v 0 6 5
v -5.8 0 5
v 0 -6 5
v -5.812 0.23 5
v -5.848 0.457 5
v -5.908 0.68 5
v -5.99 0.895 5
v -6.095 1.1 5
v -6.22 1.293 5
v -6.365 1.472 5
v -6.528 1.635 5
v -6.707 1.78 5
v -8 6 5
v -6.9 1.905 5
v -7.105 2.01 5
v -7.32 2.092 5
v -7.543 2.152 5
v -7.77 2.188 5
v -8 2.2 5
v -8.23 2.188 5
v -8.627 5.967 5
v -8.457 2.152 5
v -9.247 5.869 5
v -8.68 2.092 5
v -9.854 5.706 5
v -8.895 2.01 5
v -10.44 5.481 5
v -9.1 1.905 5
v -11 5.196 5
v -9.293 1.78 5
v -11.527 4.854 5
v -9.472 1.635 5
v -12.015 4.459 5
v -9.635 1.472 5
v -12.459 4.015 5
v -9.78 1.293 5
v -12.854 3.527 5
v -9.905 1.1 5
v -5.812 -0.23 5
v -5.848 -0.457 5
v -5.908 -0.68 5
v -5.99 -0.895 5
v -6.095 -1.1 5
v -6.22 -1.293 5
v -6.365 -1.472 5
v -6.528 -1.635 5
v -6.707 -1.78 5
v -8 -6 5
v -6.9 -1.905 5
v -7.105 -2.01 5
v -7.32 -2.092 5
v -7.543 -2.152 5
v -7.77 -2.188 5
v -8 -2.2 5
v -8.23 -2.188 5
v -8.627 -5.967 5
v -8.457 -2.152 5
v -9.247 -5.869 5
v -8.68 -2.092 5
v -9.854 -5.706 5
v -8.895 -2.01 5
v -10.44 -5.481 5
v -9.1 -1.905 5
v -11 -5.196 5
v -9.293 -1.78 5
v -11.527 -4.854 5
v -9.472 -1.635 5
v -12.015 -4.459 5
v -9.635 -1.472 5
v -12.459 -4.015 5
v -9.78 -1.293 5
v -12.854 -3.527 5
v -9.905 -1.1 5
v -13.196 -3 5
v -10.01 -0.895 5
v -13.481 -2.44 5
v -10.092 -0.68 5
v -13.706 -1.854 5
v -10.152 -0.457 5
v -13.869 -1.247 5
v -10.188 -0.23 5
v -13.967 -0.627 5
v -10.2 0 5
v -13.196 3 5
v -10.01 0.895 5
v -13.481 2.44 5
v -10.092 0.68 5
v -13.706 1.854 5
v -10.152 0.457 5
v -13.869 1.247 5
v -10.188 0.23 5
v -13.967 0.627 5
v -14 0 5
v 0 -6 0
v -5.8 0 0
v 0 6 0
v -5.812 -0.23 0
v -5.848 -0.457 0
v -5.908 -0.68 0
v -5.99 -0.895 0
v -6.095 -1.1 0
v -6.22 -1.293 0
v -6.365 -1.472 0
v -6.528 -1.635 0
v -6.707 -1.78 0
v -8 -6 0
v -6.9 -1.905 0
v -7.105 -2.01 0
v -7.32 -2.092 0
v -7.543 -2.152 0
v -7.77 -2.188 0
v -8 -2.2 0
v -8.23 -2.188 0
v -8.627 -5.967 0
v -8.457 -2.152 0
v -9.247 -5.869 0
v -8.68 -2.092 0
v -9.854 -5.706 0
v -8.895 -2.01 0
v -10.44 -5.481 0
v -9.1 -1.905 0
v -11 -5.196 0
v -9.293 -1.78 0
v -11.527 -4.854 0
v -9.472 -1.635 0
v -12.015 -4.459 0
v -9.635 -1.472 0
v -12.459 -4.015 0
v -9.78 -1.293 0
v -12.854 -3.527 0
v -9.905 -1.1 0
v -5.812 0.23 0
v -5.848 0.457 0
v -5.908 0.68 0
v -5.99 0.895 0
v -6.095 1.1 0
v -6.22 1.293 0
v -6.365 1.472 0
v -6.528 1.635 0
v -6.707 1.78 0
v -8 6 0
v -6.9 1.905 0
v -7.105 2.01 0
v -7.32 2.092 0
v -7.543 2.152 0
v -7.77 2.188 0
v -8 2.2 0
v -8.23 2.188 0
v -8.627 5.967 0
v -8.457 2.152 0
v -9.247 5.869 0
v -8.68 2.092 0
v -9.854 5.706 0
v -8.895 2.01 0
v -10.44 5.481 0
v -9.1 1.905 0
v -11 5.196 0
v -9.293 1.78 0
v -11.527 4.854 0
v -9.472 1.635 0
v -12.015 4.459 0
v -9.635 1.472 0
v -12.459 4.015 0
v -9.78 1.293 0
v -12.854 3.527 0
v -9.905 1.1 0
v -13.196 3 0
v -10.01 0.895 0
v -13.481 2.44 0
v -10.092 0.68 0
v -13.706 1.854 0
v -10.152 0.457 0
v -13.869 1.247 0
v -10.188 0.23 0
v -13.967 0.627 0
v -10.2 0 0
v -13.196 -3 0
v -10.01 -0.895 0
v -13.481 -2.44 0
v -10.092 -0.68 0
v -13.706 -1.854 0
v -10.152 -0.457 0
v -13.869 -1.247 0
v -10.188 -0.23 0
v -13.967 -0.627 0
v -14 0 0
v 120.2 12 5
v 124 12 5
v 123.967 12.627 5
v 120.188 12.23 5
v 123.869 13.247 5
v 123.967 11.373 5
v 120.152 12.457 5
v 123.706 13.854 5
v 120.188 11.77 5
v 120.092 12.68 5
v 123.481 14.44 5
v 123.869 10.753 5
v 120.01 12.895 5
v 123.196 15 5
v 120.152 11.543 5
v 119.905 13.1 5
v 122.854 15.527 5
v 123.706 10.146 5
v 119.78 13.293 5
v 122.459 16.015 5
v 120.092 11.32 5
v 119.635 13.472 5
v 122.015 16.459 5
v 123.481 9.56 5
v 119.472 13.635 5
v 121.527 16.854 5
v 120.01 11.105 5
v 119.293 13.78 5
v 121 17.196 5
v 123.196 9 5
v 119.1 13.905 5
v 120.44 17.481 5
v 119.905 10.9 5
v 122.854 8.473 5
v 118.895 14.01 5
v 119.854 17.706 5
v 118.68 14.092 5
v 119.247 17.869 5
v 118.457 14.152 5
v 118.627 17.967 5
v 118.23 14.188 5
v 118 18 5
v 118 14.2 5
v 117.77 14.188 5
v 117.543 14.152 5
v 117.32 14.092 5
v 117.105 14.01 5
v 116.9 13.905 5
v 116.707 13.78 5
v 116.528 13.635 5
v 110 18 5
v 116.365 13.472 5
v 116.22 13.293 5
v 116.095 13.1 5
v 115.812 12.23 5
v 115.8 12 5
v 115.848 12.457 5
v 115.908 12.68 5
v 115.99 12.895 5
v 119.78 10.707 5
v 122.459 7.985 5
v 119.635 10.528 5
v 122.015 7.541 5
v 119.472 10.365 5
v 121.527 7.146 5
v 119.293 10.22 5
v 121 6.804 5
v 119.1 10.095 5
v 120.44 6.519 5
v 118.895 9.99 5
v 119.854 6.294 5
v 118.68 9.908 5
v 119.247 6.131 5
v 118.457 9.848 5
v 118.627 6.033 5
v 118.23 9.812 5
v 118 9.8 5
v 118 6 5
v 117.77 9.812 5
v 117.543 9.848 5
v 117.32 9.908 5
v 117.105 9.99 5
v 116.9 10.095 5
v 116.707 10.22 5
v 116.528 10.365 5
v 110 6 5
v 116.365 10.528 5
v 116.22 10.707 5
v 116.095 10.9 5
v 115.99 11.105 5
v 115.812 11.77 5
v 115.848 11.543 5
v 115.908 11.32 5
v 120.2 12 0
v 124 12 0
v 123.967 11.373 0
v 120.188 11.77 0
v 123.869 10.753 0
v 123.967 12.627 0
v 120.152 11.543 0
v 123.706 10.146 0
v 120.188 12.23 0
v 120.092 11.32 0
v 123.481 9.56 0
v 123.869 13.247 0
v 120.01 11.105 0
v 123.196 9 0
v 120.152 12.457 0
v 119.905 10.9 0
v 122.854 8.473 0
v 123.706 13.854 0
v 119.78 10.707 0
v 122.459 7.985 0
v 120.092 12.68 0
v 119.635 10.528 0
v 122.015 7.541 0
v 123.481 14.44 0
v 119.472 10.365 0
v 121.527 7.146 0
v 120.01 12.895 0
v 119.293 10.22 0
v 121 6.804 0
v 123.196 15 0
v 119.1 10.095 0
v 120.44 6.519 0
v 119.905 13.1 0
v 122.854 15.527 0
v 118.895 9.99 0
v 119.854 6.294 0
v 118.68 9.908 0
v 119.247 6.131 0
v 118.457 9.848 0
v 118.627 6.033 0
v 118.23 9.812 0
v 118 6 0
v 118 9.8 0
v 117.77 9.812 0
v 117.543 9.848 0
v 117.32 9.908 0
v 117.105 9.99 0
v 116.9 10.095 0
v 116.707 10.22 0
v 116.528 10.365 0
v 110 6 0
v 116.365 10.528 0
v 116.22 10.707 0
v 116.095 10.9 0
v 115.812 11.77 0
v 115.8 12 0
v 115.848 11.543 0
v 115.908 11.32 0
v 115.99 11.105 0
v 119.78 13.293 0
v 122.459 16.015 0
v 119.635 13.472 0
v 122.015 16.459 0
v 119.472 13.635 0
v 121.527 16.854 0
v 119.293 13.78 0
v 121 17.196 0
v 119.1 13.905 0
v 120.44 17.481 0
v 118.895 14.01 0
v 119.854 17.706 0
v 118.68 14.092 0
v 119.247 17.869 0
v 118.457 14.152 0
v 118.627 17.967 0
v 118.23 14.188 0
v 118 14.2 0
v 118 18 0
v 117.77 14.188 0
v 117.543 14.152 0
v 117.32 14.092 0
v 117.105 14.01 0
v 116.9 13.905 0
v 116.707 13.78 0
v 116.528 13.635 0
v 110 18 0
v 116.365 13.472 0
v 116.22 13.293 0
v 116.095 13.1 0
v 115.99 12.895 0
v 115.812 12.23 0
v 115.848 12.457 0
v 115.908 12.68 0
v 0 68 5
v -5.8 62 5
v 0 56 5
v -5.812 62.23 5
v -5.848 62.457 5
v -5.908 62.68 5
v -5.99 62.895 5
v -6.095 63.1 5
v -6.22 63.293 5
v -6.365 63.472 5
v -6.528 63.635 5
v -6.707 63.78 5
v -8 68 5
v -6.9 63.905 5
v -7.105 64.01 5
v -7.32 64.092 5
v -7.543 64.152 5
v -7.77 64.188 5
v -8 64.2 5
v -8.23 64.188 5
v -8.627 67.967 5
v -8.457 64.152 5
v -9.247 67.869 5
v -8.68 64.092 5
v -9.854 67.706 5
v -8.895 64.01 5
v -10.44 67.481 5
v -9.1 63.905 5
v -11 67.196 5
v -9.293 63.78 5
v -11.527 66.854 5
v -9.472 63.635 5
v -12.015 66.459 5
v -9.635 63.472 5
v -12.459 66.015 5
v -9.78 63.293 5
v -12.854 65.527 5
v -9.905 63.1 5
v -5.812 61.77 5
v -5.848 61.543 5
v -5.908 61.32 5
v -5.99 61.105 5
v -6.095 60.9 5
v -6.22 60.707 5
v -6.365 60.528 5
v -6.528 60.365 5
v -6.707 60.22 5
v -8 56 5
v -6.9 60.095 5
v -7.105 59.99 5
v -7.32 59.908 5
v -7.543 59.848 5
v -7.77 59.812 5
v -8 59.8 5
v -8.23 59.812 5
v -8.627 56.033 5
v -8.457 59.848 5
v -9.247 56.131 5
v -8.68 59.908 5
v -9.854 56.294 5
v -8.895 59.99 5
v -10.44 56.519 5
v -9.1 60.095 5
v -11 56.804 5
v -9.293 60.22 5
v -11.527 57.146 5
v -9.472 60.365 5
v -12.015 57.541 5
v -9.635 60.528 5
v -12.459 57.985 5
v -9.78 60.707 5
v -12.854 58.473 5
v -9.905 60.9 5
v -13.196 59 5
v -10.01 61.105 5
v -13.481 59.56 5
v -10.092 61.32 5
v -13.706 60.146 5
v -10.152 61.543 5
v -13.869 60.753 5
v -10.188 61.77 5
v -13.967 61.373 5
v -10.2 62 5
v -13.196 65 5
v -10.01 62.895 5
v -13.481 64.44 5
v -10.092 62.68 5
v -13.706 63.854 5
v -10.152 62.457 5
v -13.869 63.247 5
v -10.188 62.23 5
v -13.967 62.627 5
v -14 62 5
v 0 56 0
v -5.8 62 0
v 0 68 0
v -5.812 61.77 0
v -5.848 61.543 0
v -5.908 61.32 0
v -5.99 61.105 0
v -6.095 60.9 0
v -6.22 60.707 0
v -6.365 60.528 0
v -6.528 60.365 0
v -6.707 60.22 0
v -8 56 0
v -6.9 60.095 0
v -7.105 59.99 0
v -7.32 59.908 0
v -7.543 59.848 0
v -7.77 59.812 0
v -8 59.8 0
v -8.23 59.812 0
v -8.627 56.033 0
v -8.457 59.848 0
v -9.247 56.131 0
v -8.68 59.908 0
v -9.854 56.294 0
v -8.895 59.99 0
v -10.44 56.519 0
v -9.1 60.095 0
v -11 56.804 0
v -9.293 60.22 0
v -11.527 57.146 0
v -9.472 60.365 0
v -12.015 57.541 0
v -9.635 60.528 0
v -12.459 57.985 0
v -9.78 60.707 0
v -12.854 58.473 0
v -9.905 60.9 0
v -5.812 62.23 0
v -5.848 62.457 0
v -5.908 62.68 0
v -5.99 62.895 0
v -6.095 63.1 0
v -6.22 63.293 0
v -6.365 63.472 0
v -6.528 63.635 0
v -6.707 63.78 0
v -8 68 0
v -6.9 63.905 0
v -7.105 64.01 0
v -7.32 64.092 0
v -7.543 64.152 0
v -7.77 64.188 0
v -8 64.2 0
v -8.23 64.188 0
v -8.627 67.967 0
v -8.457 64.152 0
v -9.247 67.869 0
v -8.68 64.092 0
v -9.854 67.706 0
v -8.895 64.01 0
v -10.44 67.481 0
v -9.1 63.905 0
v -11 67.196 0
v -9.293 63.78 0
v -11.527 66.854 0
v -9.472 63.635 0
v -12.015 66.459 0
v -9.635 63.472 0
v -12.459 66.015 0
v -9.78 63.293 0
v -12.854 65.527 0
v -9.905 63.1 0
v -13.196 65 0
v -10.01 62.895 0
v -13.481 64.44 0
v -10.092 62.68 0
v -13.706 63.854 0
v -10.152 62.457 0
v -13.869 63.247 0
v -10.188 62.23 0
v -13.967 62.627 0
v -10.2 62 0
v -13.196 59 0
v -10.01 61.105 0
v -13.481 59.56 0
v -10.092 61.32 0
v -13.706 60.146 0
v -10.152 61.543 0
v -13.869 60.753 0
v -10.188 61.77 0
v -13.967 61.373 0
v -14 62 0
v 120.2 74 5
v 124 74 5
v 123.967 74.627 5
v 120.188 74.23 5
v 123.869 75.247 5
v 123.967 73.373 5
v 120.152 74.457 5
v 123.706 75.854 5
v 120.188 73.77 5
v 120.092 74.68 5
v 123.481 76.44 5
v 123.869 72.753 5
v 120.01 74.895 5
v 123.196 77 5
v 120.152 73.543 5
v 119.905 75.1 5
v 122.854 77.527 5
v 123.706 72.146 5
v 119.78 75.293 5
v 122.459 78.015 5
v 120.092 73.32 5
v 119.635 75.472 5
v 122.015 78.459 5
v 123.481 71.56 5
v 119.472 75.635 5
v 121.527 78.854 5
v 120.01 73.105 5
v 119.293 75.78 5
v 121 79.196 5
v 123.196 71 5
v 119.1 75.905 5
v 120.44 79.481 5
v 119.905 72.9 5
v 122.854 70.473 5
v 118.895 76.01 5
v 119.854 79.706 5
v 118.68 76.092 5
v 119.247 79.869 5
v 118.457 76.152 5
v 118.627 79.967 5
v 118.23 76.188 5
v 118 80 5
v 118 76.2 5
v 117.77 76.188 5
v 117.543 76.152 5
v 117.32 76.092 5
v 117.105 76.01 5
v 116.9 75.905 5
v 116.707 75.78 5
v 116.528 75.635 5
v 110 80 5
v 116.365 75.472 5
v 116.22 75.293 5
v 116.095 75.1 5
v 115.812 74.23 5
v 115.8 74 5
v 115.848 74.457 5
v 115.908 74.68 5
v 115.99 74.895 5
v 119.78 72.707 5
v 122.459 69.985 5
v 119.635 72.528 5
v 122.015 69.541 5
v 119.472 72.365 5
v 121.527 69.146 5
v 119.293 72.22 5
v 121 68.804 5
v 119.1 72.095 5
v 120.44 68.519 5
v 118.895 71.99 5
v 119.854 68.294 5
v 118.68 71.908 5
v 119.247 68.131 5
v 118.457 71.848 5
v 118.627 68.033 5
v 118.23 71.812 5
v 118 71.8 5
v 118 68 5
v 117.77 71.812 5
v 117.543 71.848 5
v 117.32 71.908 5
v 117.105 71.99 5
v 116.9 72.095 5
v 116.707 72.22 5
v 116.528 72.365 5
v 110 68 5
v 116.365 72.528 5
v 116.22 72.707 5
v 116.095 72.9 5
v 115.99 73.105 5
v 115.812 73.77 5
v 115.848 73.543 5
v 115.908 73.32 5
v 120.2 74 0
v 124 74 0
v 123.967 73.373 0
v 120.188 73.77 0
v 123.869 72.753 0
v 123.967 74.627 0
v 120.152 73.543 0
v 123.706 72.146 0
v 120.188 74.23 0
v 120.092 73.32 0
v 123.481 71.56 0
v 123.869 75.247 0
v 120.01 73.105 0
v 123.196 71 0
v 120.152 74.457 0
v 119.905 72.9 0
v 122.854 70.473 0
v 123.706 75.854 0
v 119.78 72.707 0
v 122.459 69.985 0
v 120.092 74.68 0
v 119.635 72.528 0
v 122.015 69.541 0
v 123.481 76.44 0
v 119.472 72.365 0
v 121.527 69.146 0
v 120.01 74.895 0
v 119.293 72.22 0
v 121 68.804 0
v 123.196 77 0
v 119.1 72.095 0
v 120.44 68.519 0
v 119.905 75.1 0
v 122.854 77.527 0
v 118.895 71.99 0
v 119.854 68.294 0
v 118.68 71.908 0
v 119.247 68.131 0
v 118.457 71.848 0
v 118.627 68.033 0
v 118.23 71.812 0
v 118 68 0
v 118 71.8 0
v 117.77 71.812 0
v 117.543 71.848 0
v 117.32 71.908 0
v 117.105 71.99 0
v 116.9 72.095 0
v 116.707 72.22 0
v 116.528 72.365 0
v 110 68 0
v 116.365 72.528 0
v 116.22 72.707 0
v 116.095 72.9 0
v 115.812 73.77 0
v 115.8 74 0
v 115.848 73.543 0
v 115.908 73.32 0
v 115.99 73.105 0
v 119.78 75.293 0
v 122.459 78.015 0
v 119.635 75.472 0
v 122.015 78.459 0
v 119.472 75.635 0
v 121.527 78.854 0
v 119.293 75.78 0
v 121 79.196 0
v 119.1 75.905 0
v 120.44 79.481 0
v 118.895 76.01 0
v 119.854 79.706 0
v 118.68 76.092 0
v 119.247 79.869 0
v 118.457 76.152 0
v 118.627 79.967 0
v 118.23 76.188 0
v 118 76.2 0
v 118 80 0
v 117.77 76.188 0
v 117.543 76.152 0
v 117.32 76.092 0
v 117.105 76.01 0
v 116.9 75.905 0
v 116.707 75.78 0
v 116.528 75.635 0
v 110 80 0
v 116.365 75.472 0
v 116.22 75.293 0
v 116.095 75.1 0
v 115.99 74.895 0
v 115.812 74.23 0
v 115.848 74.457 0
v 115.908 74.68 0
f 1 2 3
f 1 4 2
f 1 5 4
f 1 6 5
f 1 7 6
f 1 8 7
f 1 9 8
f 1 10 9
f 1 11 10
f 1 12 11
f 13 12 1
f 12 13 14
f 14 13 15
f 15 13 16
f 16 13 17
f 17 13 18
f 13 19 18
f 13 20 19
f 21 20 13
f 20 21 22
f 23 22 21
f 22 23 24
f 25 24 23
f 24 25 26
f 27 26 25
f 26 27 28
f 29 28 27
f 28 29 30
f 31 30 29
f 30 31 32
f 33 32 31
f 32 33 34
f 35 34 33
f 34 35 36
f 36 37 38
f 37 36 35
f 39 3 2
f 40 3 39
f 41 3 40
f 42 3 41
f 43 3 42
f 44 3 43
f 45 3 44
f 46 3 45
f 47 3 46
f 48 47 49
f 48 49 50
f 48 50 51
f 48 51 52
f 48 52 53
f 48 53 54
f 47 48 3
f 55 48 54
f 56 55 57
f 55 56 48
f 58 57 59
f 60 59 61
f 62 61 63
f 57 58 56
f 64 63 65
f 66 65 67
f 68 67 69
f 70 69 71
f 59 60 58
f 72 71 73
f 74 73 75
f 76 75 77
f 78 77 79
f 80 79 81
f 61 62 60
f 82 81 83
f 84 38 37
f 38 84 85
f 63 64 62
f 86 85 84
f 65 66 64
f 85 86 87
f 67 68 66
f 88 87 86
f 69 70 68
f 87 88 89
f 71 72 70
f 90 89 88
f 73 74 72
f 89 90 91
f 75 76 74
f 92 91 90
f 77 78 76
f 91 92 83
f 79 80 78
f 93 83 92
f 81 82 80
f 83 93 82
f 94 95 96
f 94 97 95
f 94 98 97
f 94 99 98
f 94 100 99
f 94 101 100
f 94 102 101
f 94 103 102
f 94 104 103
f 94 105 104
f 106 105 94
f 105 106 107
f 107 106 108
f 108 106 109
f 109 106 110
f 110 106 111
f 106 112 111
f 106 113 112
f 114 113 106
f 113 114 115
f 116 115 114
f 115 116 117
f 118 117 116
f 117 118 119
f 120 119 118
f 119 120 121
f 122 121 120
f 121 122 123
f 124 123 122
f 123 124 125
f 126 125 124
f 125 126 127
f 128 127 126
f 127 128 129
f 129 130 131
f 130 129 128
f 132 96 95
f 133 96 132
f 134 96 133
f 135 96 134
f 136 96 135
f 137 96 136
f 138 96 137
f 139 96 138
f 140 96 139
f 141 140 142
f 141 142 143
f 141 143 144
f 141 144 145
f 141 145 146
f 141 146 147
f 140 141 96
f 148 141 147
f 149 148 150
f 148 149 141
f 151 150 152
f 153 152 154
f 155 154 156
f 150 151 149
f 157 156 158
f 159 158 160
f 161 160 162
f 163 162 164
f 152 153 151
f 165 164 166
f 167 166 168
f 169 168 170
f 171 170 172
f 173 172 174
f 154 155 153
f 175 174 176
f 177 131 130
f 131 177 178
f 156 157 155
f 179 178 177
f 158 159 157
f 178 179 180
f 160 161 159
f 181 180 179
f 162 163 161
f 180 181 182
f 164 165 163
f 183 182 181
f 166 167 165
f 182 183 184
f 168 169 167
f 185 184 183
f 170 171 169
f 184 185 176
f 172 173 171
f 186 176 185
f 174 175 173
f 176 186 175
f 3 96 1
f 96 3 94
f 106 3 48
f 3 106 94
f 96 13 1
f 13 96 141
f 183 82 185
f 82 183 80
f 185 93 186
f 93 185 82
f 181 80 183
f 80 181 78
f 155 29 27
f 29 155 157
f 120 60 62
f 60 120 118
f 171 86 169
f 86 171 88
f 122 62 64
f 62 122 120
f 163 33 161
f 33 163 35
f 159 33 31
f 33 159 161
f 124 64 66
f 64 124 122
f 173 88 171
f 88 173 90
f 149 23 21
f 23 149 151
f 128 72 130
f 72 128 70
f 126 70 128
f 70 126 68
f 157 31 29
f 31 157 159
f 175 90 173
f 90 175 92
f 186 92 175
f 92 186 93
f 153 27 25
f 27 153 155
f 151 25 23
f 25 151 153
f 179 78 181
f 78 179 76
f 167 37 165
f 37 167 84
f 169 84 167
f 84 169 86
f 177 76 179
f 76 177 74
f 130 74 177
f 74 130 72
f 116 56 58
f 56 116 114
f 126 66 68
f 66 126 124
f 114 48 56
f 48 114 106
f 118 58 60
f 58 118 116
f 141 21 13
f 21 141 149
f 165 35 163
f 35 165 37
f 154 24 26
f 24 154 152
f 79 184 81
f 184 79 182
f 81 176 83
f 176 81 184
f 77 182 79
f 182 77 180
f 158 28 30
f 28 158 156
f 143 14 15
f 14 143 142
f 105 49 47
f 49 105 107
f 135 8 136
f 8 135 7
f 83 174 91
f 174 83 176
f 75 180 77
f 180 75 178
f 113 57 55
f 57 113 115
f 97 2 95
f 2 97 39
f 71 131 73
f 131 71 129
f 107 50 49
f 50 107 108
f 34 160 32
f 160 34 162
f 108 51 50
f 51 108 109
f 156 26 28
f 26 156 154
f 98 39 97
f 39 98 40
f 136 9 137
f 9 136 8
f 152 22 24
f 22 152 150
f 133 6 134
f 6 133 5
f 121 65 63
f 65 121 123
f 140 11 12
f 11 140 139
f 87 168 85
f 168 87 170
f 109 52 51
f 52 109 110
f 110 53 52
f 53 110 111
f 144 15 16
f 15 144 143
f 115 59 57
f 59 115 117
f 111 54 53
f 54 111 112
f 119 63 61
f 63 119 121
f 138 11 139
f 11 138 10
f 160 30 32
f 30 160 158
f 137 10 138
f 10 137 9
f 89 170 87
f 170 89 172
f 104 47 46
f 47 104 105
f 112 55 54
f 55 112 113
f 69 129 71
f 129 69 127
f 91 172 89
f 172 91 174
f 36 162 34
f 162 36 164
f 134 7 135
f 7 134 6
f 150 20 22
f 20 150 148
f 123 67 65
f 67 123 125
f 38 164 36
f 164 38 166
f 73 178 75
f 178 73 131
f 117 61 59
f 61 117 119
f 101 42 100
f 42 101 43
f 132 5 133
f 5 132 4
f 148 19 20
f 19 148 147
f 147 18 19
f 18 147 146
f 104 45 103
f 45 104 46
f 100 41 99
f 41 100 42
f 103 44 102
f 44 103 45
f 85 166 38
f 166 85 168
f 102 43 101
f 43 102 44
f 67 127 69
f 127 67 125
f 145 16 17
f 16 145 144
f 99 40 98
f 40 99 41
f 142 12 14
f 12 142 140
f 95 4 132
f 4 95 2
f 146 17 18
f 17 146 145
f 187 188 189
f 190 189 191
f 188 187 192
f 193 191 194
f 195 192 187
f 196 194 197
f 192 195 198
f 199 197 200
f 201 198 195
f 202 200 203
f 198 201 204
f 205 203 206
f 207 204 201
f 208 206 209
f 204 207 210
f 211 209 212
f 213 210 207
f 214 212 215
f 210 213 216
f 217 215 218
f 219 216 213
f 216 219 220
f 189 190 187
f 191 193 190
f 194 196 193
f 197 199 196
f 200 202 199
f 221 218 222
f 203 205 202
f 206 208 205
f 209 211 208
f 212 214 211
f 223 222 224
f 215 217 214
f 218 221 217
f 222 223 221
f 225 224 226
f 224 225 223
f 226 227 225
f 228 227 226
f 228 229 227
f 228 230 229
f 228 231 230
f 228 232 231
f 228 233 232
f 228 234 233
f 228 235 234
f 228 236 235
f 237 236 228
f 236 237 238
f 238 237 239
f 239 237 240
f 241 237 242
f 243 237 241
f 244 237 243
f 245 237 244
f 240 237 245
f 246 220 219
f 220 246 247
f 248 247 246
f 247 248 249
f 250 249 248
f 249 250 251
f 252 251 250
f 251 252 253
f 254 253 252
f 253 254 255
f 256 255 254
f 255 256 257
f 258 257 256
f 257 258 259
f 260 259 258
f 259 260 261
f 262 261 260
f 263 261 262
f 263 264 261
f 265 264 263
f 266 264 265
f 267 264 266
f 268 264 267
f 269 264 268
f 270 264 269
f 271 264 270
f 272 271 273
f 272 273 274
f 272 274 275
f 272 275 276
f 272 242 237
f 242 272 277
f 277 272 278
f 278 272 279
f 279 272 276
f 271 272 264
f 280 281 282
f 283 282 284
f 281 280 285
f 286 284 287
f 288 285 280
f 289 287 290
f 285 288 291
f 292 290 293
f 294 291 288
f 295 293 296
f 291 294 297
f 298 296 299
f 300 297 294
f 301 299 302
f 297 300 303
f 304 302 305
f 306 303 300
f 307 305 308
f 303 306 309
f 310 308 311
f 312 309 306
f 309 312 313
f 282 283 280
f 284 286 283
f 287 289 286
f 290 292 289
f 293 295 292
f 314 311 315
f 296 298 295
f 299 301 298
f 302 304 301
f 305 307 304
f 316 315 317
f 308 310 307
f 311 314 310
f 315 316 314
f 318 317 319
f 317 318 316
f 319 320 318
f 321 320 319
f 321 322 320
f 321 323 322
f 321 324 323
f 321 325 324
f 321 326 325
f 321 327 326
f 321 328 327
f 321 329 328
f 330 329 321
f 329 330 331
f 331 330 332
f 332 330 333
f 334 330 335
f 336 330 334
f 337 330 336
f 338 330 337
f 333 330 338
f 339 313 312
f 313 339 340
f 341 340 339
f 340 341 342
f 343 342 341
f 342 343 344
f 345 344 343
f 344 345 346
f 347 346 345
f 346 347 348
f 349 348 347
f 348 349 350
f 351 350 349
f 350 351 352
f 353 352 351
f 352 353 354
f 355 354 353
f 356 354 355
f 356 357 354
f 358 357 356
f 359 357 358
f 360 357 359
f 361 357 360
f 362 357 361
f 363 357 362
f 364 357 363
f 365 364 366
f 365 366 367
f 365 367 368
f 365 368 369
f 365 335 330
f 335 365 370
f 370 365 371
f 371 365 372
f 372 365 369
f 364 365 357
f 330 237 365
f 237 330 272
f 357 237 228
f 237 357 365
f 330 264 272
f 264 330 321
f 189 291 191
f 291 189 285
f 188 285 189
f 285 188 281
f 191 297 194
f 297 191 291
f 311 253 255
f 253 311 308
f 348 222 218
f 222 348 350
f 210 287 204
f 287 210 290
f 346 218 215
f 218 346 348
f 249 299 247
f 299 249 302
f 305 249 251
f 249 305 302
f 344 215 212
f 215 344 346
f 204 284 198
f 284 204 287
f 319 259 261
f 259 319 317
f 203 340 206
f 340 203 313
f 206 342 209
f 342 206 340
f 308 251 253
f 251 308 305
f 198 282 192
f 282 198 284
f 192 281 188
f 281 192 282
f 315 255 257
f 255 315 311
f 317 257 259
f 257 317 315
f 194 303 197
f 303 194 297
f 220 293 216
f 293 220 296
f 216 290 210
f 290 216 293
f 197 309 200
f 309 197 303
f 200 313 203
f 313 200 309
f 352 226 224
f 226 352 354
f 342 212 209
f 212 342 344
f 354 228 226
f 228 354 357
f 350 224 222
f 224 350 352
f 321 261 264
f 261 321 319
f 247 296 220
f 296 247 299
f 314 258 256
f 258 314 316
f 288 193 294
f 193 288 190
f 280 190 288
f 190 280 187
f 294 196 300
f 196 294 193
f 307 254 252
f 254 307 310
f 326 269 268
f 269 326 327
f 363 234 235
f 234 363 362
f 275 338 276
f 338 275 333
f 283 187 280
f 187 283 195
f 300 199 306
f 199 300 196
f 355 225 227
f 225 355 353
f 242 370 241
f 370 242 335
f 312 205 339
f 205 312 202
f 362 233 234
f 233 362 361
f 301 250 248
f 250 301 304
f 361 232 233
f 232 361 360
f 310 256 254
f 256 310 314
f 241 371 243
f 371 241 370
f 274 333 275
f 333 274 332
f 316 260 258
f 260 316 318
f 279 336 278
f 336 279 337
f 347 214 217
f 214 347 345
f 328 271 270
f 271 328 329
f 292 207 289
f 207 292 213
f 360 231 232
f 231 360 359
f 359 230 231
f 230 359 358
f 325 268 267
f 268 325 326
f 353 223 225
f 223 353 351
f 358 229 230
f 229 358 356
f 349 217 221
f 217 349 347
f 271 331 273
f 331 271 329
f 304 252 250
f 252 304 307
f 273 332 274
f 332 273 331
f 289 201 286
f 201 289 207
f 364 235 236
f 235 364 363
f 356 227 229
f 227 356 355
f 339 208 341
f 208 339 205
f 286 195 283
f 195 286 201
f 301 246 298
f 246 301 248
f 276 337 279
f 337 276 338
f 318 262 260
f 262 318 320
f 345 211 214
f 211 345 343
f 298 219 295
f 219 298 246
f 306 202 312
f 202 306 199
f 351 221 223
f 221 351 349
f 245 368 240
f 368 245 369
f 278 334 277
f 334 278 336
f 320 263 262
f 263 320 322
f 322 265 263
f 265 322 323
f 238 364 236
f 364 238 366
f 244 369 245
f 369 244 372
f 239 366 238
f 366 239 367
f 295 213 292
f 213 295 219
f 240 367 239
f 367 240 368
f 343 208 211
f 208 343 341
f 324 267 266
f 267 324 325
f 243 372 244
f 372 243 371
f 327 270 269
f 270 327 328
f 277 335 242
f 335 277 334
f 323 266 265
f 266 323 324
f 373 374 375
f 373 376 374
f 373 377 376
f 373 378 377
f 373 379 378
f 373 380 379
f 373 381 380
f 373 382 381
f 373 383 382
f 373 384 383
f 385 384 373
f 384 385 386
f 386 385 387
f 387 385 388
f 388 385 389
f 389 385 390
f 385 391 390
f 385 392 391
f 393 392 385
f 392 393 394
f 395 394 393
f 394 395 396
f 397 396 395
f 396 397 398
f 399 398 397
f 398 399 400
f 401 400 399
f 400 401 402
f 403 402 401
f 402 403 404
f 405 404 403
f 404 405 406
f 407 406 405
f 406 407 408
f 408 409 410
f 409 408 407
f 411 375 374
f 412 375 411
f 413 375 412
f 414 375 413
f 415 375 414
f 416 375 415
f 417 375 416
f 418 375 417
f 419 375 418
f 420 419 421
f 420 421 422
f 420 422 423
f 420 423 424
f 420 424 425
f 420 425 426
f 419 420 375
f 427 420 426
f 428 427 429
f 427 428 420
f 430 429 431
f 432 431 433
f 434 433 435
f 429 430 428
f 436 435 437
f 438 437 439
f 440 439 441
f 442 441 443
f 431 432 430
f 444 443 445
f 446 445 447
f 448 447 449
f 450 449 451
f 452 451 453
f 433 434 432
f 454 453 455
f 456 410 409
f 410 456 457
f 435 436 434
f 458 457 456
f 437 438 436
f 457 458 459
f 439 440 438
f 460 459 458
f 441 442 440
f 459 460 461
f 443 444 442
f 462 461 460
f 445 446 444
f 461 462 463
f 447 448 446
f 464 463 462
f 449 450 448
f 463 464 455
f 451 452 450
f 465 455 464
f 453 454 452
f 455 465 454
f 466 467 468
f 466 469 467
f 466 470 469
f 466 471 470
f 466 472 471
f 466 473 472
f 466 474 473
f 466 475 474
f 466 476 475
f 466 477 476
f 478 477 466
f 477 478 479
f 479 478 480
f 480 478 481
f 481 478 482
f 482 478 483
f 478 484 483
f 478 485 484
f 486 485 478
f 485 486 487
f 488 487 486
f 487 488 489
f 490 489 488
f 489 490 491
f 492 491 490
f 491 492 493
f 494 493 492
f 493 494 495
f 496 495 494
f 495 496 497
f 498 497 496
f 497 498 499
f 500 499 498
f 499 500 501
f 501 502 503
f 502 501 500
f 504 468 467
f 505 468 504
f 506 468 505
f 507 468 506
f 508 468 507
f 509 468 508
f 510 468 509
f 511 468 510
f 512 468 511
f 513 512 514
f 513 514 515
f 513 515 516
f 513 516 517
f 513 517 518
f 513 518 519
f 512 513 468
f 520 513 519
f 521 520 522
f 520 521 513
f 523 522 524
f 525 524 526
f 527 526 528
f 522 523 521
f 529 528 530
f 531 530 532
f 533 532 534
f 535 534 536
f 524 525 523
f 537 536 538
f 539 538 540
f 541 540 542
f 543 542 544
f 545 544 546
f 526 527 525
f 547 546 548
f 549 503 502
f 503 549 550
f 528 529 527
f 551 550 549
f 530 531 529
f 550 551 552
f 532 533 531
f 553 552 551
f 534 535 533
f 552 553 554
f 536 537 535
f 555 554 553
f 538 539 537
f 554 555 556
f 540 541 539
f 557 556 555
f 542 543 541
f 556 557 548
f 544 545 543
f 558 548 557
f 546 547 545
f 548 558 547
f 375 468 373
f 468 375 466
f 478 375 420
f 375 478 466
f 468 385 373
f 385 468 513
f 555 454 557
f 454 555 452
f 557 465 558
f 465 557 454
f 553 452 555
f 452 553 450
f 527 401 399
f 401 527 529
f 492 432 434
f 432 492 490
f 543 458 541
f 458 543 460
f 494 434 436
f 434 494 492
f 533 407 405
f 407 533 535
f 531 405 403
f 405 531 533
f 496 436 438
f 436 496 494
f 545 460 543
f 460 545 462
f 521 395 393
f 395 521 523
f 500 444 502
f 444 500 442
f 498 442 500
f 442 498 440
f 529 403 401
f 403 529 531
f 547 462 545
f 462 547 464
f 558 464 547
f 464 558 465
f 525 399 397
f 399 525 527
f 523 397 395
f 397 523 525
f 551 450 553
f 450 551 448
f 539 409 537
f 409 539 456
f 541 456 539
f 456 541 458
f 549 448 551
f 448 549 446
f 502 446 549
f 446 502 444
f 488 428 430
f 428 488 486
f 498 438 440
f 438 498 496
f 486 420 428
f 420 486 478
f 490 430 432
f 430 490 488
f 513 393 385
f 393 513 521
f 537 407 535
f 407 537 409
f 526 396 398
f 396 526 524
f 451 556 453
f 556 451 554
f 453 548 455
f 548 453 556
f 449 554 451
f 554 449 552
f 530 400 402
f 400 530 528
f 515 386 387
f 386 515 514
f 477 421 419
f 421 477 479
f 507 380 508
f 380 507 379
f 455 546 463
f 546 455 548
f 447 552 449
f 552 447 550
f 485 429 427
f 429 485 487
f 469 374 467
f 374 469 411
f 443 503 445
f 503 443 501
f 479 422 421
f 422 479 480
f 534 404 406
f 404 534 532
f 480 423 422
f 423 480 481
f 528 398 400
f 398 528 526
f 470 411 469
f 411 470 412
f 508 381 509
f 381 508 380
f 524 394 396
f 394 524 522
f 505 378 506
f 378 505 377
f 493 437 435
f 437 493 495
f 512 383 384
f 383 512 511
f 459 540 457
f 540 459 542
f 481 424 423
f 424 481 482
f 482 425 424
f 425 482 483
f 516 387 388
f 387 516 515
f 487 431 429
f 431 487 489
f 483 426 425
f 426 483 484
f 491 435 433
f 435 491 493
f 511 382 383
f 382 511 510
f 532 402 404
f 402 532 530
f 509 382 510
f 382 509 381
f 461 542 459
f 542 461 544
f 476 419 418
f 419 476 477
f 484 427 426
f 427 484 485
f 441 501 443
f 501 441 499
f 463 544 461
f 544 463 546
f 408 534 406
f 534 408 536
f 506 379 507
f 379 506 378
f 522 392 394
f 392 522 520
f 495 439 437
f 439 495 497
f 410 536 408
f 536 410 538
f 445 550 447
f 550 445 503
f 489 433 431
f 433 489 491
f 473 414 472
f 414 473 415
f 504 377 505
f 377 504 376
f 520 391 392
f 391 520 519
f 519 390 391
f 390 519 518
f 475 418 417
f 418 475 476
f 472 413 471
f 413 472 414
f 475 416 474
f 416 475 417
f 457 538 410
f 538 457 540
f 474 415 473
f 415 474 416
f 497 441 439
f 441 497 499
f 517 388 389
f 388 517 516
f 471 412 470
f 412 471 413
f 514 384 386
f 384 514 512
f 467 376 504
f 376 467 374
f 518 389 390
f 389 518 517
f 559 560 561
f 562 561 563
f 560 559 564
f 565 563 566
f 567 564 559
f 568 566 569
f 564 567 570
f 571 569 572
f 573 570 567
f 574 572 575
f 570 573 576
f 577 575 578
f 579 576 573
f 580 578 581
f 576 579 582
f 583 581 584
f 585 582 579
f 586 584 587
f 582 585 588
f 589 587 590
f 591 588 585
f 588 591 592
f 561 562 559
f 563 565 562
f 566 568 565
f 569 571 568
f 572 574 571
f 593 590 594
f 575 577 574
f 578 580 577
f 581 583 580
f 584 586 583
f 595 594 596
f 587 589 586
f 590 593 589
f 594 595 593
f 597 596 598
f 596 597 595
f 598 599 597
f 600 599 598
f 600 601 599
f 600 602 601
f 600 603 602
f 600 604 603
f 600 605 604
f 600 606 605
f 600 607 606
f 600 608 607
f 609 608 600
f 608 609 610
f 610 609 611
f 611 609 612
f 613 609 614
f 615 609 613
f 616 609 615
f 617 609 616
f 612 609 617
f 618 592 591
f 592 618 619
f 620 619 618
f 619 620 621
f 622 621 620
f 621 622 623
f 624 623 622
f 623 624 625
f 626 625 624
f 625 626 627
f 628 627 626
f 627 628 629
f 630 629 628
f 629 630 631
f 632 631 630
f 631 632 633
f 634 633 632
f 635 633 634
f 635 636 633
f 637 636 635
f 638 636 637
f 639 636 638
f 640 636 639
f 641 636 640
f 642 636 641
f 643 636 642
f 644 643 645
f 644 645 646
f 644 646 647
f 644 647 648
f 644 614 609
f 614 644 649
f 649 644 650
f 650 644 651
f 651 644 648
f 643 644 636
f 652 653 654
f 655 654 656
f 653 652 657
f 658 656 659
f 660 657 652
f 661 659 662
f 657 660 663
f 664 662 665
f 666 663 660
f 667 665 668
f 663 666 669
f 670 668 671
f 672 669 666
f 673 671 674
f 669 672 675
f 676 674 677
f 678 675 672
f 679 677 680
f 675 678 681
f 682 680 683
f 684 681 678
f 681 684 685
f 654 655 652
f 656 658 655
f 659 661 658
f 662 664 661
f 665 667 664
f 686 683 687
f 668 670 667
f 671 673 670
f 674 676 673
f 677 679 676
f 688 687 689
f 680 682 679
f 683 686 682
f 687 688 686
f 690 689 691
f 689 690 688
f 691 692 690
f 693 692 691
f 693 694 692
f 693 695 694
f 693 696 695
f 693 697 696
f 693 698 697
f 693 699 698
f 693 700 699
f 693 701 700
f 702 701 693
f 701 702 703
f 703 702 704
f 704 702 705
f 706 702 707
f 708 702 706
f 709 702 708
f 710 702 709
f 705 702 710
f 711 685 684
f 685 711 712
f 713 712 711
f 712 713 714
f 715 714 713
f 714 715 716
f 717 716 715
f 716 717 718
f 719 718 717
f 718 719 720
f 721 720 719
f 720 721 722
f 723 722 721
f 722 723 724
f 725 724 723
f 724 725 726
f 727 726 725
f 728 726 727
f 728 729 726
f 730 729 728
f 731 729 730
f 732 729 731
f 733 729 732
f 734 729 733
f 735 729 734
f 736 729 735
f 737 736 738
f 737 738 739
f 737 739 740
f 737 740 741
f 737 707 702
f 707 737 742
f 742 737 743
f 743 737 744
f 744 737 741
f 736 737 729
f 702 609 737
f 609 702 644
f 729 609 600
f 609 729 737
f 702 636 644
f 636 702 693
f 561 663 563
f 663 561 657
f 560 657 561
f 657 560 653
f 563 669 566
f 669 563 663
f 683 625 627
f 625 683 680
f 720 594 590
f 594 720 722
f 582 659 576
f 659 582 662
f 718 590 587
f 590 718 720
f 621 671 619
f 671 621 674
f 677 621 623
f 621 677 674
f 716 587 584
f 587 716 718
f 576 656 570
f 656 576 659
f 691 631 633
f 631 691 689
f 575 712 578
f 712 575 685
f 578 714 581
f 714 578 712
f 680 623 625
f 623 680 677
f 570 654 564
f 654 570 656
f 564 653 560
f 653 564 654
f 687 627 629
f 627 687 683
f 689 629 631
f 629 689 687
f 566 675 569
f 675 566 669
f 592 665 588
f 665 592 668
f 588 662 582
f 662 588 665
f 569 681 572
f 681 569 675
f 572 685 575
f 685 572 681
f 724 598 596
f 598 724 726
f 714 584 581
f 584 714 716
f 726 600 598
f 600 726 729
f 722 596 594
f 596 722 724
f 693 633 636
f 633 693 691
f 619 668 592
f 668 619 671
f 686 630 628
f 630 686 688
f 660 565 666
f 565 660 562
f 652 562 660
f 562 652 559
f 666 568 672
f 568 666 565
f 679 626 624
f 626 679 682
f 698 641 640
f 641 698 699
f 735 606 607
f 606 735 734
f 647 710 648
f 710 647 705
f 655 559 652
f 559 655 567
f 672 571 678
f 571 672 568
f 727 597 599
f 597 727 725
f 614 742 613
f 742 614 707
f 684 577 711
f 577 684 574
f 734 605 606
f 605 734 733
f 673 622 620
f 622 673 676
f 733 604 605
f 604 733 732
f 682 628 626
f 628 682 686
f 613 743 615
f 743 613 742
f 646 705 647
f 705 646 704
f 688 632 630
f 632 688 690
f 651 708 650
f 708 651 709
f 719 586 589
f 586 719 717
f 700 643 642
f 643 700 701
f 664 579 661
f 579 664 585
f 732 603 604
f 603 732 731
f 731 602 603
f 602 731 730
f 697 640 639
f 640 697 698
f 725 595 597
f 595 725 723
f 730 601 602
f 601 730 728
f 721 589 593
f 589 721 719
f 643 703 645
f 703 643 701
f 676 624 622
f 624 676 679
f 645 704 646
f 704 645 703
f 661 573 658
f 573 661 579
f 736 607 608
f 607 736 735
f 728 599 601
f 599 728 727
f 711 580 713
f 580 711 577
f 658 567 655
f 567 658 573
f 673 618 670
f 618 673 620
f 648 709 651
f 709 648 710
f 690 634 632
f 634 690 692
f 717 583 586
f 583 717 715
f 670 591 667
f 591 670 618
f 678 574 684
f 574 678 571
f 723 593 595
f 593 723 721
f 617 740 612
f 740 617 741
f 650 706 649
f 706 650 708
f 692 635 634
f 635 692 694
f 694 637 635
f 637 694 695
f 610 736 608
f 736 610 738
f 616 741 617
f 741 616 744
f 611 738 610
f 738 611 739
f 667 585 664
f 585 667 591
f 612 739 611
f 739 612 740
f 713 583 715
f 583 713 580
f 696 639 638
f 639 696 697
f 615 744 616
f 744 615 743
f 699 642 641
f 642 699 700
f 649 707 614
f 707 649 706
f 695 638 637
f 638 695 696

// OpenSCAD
// file: ../../00_common/screw_bosses.scad
// =============================================================================
// OpenMotorBridge - Screw Bosses & Fastener Primitives
// =============================================================================
// File: hardware/cad/scad/00_common/screw_bosses.scad
// Description: Reusable parametric modules for screw standoffs, corner clamping
//              posts, and mounting ears.
// =============================================================================

include <parameters.scad>;

// 1. Cylindrical Screw Standoff Boss (with center hole)
module screw_boss(outer_r=2.5, inner_r=1.2, h=5.0) {
    difference() {
        cylinder(r=outer_r, h=h, center=false);
        translate([0, 0, -0.1])
            cylinder(r=inner_r, h=h + 0.2, center=false);
    }
}

// 2. Rectangular Corner Clamping Post (with center screw hole)
module corner_screw_post(size_x=5.0, size_y=5.0, h=12.0, hole_r=1.65, hole_h=10.0, hole_offset_z=2.0) {
    difference() {
        cube(size=[size_x, size_y, h], center=false);
        translate([size_x/2.0, size_y/2.0, hole_offset_z])
            cylinder(r=hole_r, h=hole_h + 0.1, center=false);
    }
}

// 3. M4 Silentblock Outer Mounting Ear (with rubber buffer hole)
module mounting_ear_m4(ear_len=12.0, ear_w=10.0, ear_h=6.0, hole_r=2.2) {
    difference() {
        union() {
            cube(size=[ear_len - ear_w/2.0, ear_w, ear_h], center=false);
            translate([ear_len - ear_w/2.0, ear_w/2.0, 0])
                cylinder(r=ear_w/2.0, h=ear_h, center=false);
        }
        translate([ear_len - ear_w/2.0, ear_w/2.0, -0.1])
            cylinder(r=hole_r, h=ear_h + 0.2, center=false);
    }
}

// 4. Copper Thermal Stud Pad / Pocket
module copper_stud(r=COPPER_STUD_R, h=2.5) {
    color("darkorange")
        cylinder(r=r, h=h, center=false);
}
// file: ../../00_common/parameters.scad
// =============================================================================
// OpenMotorBridge - Global CAD Parameters & Settings
// =============================================================================
// File: hardware/cad/scad/00_common/parameters.scad
// Description: Global dimensional constants, manufacturing clearances and
//              circle resolution ($fn) for all OpenSCAD modules.
// =============================================================================

// --- 1. Circle & Curve Resolution ---
$fn = 60; // Smooth cylinders and holes for high-quality MJF 3D printing

// --- 2. Central Main Box Dimensions (3-Tier Sandwich) ---
MAIN_BOX_OUTER_L      = 110.0; // Outer length in X (mm)
MAIN_BOX_OUTER_W      = 74.0;  // Outer width in Y (mm)
MAIN_BOX_LOWER_H      = 17.0;  // Lower case height in Z (mm)
MAIN_BOX_MID_H        = 15.0;  // Mid tray height in Z (mm)
MAIN_BOX_LID_H        = 4.0;   // Lid plate thickness in Z (mm)
MAIN_BOX_WALL         = 2.5;   // Nominal wall thickness (mm)
MAIN_BOX_CORNER_POST  = 5.0;   // Corner clamping screw post size (mm)

// --- 3. Satellite Pod Dimensions (Universal 1-Pod Housing) ---
POD_OUTER_L           = 100.0; // Outer length in X (mm)
POD_OUTER_W           = 60.0;  // Outer width in Y (mm)
POD_OUTER_H           = 28.0;  // Outer height in Z (mm)
POD_WALL              = 2.5;   // Nominal wall thickness (mm)
POD_BULKHEAD_X        = 22.0;  // Partition bulkhead position in X (mm)
POD_CHAMBER_L         = 78.0;  // Sliding chamber length in X (mm)
POD_CHAMBER_W         = 55.0;  // Sliding chamber width in Y (mm)
POD_CHAMBER_H         = 23.0;  // Sliding chamber height in Z (mm)

// --- 4. Pod Linear Guide Rails (Poka-Yoke Tongue & Groove) ---
POD_GROOVE_W          = 3.0;   // Internal guide groove width in Z (mm)
POD_GROOVE_DEPTH      = 1.5;   // Internal guide groove depth in Y (mm)
POD_GROOVE_LEFT_Z     = 8.2;   // Center height of left groove (mm)
POD_GROOVE_RIGHT_Z    = 14.2;  // Center height of right groove (mm, asym offset)

CARTRIDGE_TONGUE_W    = 2.6;   // Cartridge tongue rail height in Z (mm, 0.2mm clearance)
CARTRIDGE_TONGUE_PROT = 1.4;   // Cartridge tongue protrusion in Y (mm, 0.1mm clearance)
CARTRIDGE_CHAMFER_L   = 4.0;   // 30° lead-in chamfer nose length (mm)

// --- 5. Cartridge Dimensions ---
CARTRIDGE_BASE_L      = 75.0;  // Sled length in X (mm)
CARTRIDGE_BASE_W      = 54.0;  // Sled width in Y (mm)
CARTRIDGE_BASE_H      = 20.5;  // Sled height in Z (mm)
CARTRIDGE_FACE_L      = 4.0;   // Front faceplate thickness in X (mm)
CARTRIDGE_FACE_W      = 58.0;  // Front faceplate width in Y (mm)
CARTRIDGE_FACE_H      = 25.0;  // Front faceplate height in Z (mm)

// --- 6. Thermal Copper Studs (Kühlbolzen) ---
COPPER_STUD_DIA       = 8.0;   // Diameter of thermal copper studs (mm)
COPPER_STUD_R         = COPPER_STUD_DIA / 2.0; // Radius = 4.0 mm

// Main Box Thermal Stud Positions (4x in lower case floor)
MAIN_BOX_CU_POS = [
    [35.0, 25.0], // Position 1 (LM5164 DCDC Buck Regulator)
    [45.0, 25.0], // Position 2 (BQ25798 LiPo Charger)
    [30.0, 48.0], // Position 3 (ESP32-S3 Dual-Core SoC)
    [70.0, 40.0]  // Position 4 (Automotive TVS & LC Filter Zone)
];

// Pod & Cartridge Thermal Stud Positions (2x in floor)
POD_CU_POS = [
    [42.0, 30.0], // Forward thermal zone
    [72.0, 30.0]  // Rearward thermal zone
];

// --- 7. Screw & Clearance Dimensions ---
M2_SCREW_HOLE_R       = 1.1;   // M2 clearance hole (r = 1.1 mm -> Ø 2.2 mm)
M2_5_SCREW_HOLE_R     = 1.4;   // M2.5 clearance hole (r = 1.4 mm -> Ø 2.8 mm)
M3_SCREW_HOLE_R       = 1.65;  // M3 clearance hole (r = 1.65 mm -> Ø 3.3 mm)
M4_SCREW_HOLE_R       = 2.2;   // M4 clearance hole (r = 2.2 mm -> Ø 4.4 mm)
M8_BORE_R             = 4.0;   // M8 cable through-bore (r = 4.0 mm -> Ø 8.0 mm)
M8_STUDS_OUTER_R      = 6.0;   // M8 neck outer radius (Ø 12.0 mm)
// main file
// =============================================================================
// OpenMotorBridge - Main Box: Outer Mounting Ears (4x M4 Silentblock)
// =============================================================================
// File: hardware/cad/scad/01_main_box/parts/004_mounting_ears.scad
// =============================================================================

include <../../00_common/parameters.scad>;
include <../../00_common/screw_bosses.scad>;

module main_box_mounting_ears(length=110.0, width=74.0, ear_len=14.0, ear_w=12.0, ear_h=5.0) {
    // 1. Bottom-Left Ear (-X, -Y corner)
    translate([0, 6.0, 0])
        rotate([0, 0, 180])
            mounting_ear_m4(ear_len=ear_len, ear_w=ear_w, ear_h=ear_h, hole_r=M4_SCREW_HOLE_R);

    // 2. Bottom-Right Ear (+X, -Y corner)
    translate([length, 6.0, 0])
        rotate([0, 0, 0])
            mounting_ear_m4(ear_len=ear_len, ear_w=ear_w, ear_h=ear_h, hole_r=M4_SCREW_HOLE_R);

    // 3. Top-Left Ear (-X, +Y corner)
    translate([0, width - 6.0, 0])
        rotate([0, 0, 180])
            mounting_ear_m4(ear_len=ear_len, ear_w=ear_w, ear_h=ear_h, hole_r=M4_SCREW_HOLE_R);

    // 4. Top-Right Ear (+X, +Y corner)
    translate([length, width - 6.0, 0])
        rotate([0, 0, 0])
            mounting_ear_m4(ear_len=ear_len, ear_w=ear_w, ear_h=ear_h, hole_r=M4_SCREW_HOLE_R);
}

// Standalone preview
main_box_mounting_ears();
